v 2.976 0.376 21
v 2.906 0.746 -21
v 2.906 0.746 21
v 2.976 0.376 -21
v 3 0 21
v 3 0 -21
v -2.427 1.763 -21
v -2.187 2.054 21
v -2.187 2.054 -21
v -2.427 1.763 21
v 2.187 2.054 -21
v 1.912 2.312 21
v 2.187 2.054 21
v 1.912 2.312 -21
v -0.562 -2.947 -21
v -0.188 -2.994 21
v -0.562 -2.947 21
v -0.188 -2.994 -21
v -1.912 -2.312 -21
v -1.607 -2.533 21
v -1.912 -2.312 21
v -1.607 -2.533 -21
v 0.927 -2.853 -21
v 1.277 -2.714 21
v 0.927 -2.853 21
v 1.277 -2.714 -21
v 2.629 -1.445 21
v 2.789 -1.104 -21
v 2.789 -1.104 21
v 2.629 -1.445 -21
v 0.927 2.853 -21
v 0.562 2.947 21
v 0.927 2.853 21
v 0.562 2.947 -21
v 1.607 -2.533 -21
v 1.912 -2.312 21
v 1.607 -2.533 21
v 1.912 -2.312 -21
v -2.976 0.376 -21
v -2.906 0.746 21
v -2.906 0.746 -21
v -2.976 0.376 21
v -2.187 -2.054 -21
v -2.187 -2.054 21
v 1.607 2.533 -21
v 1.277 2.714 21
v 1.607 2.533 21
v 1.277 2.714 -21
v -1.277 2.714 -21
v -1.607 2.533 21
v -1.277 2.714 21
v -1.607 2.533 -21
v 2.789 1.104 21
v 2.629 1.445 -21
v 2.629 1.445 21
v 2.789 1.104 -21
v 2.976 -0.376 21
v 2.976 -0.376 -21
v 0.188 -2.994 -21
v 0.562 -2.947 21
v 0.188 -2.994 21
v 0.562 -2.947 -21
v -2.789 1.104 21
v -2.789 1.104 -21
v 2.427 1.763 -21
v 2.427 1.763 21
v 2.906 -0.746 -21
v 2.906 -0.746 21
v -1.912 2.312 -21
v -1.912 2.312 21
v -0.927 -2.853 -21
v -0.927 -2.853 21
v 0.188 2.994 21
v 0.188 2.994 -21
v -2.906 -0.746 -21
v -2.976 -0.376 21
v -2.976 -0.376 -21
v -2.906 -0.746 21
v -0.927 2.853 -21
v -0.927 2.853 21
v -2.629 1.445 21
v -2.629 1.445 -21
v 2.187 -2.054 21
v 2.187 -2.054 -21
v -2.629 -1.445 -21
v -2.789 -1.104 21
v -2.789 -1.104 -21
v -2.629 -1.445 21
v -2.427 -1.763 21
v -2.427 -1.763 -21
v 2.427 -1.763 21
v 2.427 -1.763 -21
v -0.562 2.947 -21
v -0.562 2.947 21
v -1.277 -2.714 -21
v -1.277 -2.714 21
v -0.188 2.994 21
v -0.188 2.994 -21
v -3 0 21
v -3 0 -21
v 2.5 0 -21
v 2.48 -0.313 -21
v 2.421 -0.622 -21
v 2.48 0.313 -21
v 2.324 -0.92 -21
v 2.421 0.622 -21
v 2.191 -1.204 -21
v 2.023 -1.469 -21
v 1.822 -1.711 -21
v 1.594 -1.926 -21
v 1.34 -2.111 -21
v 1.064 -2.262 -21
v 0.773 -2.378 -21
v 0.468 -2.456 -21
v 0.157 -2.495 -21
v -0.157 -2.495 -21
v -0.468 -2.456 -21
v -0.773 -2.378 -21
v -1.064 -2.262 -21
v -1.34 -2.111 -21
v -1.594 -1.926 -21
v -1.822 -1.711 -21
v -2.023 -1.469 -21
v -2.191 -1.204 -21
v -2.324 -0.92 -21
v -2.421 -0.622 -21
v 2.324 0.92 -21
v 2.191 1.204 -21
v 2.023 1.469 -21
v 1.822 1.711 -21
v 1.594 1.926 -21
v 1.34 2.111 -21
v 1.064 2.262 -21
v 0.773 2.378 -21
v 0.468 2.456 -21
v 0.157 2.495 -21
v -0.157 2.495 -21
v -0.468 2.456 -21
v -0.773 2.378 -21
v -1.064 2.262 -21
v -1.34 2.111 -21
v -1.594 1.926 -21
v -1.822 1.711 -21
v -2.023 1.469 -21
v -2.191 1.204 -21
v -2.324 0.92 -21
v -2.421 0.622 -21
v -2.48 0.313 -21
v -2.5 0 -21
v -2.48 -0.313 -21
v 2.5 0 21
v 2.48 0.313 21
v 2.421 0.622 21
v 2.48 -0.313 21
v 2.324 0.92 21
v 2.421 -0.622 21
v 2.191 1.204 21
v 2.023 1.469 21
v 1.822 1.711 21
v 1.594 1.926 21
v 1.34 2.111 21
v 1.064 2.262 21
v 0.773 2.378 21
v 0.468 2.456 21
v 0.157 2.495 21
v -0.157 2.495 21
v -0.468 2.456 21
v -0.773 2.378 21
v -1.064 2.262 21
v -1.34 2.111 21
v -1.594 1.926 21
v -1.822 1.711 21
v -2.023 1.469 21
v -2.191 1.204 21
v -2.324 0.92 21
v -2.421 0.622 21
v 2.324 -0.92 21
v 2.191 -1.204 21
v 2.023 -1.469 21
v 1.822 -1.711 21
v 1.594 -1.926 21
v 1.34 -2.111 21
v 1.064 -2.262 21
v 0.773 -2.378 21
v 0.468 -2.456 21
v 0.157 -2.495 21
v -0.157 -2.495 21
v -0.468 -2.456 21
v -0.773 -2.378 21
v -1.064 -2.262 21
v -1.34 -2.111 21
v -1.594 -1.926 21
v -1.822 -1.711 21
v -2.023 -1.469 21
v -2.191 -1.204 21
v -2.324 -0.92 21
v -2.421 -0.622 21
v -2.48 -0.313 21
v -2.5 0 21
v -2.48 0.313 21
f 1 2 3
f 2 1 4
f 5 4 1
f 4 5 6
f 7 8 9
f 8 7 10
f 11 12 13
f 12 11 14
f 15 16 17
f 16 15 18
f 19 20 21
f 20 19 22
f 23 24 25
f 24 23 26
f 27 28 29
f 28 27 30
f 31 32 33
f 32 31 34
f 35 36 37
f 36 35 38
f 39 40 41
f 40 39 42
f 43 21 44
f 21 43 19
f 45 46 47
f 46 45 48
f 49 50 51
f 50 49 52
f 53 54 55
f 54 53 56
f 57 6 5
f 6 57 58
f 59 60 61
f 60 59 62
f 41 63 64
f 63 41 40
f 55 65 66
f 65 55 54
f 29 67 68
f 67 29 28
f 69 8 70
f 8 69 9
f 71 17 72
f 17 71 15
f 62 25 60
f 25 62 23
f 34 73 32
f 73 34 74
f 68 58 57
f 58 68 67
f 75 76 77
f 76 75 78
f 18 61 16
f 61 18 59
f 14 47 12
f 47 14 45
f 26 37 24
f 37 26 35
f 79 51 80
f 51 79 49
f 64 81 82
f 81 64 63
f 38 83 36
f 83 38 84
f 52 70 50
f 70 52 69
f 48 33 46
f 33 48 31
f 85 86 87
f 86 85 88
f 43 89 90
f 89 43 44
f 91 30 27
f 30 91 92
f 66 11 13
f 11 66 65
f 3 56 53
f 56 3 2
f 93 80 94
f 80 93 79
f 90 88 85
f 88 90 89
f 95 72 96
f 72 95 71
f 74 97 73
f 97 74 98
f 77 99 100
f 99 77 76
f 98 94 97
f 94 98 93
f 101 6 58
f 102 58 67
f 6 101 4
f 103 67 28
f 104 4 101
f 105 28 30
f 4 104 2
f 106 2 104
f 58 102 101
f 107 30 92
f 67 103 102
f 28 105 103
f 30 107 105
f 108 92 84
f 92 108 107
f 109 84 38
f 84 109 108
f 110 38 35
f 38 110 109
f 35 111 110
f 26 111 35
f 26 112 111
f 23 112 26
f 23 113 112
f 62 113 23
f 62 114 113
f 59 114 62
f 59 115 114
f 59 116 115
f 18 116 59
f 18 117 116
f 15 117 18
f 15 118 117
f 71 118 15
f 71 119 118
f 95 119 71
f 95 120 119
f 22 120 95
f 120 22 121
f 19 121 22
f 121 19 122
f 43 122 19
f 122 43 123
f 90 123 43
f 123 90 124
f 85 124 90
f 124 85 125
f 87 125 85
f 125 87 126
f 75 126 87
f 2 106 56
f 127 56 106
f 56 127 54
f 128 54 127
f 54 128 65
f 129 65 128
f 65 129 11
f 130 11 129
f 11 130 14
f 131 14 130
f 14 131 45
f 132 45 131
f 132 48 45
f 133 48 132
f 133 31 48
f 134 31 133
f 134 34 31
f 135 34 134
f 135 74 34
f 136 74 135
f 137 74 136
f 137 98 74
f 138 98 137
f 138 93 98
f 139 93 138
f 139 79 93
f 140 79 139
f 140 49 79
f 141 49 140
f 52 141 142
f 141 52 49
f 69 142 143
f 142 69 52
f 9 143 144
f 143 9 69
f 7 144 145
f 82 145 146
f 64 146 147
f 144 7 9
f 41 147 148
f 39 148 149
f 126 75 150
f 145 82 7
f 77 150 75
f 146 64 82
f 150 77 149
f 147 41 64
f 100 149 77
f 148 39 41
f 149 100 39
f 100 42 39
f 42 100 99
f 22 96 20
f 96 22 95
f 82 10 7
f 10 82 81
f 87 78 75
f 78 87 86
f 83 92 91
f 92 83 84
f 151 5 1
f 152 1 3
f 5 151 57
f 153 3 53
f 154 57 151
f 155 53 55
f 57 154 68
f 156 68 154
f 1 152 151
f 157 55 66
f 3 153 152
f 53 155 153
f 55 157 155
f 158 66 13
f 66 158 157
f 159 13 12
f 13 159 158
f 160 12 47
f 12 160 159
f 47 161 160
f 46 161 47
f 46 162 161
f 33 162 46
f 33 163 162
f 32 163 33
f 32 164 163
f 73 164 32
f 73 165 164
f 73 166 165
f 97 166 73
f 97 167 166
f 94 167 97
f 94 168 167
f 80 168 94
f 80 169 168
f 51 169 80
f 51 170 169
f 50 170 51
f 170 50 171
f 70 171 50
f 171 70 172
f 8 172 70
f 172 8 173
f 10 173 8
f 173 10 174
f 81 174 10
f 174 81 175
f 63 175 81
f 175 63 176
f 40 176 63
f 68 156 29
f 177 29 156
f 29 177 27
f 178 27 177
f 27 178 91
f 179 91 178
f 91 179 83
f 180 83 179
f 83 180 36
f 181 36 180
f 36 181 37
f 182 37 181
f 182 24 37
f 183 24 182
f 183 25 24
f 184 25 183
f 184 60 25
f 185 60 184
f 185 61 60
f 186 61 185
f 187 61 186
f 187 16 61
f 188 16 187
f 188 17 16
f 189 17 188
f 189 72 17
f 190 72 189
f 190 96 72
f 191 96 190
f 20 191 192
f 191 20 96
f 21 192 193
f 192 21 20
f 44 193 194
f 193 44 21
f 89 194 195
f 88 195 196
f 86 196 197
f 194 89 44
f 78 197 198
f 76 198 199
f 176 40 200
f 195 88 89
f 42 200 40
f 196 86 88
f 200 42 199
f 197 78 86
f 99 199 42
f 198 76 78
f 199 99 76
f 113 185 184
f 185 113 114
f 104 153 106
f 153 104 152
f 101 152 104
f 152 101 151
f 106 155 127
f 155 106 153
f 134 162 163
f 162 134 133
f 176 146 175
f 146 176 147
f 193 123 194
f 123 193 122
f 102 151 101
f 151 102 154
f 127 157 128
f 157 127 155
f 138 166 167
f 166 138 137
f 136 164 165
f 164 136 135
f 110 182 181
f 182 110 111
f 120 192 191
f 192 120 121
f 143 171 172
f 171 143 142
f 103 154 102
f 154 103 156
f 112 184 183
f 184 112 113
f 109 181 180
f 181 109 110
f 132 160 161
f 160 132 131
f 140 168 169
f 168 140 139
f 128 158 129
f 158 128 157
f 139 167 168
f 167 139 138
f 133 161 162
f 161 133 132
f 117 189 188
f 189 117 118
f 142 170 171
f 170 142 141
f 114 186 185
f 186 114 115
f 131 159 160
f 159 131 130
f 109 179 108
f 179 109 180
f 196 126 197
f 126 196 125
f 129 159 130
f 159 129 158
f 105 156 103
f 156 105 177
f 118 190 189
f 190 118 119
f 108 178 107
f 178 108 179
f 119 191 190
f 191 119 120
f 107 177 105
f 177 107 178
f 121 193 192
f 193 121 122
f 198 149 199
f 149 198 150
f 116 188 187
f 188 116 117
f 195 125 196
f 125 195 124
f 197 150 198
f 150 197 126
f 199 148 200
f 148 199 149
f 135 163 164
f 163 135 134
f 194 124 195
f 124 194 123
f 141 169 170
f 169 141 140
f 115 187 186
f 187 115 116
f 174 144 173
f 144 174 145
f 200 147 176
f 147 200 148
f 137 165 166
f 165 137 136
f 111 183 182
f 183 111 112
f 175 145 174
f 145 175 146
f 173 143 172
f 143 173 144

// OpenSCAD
$fn = 50;


difference() {
	union() {
		translate(v = [0, 0, -21.0000000000]) {
			cylinder(h = 42, r = 3.0000000000);
		}
	}
	union() {
		translate(v = [0, 0, -100.0000000000]) {
			cylinder(h = 200, r = 2.5000000000);
		}
	}
}
